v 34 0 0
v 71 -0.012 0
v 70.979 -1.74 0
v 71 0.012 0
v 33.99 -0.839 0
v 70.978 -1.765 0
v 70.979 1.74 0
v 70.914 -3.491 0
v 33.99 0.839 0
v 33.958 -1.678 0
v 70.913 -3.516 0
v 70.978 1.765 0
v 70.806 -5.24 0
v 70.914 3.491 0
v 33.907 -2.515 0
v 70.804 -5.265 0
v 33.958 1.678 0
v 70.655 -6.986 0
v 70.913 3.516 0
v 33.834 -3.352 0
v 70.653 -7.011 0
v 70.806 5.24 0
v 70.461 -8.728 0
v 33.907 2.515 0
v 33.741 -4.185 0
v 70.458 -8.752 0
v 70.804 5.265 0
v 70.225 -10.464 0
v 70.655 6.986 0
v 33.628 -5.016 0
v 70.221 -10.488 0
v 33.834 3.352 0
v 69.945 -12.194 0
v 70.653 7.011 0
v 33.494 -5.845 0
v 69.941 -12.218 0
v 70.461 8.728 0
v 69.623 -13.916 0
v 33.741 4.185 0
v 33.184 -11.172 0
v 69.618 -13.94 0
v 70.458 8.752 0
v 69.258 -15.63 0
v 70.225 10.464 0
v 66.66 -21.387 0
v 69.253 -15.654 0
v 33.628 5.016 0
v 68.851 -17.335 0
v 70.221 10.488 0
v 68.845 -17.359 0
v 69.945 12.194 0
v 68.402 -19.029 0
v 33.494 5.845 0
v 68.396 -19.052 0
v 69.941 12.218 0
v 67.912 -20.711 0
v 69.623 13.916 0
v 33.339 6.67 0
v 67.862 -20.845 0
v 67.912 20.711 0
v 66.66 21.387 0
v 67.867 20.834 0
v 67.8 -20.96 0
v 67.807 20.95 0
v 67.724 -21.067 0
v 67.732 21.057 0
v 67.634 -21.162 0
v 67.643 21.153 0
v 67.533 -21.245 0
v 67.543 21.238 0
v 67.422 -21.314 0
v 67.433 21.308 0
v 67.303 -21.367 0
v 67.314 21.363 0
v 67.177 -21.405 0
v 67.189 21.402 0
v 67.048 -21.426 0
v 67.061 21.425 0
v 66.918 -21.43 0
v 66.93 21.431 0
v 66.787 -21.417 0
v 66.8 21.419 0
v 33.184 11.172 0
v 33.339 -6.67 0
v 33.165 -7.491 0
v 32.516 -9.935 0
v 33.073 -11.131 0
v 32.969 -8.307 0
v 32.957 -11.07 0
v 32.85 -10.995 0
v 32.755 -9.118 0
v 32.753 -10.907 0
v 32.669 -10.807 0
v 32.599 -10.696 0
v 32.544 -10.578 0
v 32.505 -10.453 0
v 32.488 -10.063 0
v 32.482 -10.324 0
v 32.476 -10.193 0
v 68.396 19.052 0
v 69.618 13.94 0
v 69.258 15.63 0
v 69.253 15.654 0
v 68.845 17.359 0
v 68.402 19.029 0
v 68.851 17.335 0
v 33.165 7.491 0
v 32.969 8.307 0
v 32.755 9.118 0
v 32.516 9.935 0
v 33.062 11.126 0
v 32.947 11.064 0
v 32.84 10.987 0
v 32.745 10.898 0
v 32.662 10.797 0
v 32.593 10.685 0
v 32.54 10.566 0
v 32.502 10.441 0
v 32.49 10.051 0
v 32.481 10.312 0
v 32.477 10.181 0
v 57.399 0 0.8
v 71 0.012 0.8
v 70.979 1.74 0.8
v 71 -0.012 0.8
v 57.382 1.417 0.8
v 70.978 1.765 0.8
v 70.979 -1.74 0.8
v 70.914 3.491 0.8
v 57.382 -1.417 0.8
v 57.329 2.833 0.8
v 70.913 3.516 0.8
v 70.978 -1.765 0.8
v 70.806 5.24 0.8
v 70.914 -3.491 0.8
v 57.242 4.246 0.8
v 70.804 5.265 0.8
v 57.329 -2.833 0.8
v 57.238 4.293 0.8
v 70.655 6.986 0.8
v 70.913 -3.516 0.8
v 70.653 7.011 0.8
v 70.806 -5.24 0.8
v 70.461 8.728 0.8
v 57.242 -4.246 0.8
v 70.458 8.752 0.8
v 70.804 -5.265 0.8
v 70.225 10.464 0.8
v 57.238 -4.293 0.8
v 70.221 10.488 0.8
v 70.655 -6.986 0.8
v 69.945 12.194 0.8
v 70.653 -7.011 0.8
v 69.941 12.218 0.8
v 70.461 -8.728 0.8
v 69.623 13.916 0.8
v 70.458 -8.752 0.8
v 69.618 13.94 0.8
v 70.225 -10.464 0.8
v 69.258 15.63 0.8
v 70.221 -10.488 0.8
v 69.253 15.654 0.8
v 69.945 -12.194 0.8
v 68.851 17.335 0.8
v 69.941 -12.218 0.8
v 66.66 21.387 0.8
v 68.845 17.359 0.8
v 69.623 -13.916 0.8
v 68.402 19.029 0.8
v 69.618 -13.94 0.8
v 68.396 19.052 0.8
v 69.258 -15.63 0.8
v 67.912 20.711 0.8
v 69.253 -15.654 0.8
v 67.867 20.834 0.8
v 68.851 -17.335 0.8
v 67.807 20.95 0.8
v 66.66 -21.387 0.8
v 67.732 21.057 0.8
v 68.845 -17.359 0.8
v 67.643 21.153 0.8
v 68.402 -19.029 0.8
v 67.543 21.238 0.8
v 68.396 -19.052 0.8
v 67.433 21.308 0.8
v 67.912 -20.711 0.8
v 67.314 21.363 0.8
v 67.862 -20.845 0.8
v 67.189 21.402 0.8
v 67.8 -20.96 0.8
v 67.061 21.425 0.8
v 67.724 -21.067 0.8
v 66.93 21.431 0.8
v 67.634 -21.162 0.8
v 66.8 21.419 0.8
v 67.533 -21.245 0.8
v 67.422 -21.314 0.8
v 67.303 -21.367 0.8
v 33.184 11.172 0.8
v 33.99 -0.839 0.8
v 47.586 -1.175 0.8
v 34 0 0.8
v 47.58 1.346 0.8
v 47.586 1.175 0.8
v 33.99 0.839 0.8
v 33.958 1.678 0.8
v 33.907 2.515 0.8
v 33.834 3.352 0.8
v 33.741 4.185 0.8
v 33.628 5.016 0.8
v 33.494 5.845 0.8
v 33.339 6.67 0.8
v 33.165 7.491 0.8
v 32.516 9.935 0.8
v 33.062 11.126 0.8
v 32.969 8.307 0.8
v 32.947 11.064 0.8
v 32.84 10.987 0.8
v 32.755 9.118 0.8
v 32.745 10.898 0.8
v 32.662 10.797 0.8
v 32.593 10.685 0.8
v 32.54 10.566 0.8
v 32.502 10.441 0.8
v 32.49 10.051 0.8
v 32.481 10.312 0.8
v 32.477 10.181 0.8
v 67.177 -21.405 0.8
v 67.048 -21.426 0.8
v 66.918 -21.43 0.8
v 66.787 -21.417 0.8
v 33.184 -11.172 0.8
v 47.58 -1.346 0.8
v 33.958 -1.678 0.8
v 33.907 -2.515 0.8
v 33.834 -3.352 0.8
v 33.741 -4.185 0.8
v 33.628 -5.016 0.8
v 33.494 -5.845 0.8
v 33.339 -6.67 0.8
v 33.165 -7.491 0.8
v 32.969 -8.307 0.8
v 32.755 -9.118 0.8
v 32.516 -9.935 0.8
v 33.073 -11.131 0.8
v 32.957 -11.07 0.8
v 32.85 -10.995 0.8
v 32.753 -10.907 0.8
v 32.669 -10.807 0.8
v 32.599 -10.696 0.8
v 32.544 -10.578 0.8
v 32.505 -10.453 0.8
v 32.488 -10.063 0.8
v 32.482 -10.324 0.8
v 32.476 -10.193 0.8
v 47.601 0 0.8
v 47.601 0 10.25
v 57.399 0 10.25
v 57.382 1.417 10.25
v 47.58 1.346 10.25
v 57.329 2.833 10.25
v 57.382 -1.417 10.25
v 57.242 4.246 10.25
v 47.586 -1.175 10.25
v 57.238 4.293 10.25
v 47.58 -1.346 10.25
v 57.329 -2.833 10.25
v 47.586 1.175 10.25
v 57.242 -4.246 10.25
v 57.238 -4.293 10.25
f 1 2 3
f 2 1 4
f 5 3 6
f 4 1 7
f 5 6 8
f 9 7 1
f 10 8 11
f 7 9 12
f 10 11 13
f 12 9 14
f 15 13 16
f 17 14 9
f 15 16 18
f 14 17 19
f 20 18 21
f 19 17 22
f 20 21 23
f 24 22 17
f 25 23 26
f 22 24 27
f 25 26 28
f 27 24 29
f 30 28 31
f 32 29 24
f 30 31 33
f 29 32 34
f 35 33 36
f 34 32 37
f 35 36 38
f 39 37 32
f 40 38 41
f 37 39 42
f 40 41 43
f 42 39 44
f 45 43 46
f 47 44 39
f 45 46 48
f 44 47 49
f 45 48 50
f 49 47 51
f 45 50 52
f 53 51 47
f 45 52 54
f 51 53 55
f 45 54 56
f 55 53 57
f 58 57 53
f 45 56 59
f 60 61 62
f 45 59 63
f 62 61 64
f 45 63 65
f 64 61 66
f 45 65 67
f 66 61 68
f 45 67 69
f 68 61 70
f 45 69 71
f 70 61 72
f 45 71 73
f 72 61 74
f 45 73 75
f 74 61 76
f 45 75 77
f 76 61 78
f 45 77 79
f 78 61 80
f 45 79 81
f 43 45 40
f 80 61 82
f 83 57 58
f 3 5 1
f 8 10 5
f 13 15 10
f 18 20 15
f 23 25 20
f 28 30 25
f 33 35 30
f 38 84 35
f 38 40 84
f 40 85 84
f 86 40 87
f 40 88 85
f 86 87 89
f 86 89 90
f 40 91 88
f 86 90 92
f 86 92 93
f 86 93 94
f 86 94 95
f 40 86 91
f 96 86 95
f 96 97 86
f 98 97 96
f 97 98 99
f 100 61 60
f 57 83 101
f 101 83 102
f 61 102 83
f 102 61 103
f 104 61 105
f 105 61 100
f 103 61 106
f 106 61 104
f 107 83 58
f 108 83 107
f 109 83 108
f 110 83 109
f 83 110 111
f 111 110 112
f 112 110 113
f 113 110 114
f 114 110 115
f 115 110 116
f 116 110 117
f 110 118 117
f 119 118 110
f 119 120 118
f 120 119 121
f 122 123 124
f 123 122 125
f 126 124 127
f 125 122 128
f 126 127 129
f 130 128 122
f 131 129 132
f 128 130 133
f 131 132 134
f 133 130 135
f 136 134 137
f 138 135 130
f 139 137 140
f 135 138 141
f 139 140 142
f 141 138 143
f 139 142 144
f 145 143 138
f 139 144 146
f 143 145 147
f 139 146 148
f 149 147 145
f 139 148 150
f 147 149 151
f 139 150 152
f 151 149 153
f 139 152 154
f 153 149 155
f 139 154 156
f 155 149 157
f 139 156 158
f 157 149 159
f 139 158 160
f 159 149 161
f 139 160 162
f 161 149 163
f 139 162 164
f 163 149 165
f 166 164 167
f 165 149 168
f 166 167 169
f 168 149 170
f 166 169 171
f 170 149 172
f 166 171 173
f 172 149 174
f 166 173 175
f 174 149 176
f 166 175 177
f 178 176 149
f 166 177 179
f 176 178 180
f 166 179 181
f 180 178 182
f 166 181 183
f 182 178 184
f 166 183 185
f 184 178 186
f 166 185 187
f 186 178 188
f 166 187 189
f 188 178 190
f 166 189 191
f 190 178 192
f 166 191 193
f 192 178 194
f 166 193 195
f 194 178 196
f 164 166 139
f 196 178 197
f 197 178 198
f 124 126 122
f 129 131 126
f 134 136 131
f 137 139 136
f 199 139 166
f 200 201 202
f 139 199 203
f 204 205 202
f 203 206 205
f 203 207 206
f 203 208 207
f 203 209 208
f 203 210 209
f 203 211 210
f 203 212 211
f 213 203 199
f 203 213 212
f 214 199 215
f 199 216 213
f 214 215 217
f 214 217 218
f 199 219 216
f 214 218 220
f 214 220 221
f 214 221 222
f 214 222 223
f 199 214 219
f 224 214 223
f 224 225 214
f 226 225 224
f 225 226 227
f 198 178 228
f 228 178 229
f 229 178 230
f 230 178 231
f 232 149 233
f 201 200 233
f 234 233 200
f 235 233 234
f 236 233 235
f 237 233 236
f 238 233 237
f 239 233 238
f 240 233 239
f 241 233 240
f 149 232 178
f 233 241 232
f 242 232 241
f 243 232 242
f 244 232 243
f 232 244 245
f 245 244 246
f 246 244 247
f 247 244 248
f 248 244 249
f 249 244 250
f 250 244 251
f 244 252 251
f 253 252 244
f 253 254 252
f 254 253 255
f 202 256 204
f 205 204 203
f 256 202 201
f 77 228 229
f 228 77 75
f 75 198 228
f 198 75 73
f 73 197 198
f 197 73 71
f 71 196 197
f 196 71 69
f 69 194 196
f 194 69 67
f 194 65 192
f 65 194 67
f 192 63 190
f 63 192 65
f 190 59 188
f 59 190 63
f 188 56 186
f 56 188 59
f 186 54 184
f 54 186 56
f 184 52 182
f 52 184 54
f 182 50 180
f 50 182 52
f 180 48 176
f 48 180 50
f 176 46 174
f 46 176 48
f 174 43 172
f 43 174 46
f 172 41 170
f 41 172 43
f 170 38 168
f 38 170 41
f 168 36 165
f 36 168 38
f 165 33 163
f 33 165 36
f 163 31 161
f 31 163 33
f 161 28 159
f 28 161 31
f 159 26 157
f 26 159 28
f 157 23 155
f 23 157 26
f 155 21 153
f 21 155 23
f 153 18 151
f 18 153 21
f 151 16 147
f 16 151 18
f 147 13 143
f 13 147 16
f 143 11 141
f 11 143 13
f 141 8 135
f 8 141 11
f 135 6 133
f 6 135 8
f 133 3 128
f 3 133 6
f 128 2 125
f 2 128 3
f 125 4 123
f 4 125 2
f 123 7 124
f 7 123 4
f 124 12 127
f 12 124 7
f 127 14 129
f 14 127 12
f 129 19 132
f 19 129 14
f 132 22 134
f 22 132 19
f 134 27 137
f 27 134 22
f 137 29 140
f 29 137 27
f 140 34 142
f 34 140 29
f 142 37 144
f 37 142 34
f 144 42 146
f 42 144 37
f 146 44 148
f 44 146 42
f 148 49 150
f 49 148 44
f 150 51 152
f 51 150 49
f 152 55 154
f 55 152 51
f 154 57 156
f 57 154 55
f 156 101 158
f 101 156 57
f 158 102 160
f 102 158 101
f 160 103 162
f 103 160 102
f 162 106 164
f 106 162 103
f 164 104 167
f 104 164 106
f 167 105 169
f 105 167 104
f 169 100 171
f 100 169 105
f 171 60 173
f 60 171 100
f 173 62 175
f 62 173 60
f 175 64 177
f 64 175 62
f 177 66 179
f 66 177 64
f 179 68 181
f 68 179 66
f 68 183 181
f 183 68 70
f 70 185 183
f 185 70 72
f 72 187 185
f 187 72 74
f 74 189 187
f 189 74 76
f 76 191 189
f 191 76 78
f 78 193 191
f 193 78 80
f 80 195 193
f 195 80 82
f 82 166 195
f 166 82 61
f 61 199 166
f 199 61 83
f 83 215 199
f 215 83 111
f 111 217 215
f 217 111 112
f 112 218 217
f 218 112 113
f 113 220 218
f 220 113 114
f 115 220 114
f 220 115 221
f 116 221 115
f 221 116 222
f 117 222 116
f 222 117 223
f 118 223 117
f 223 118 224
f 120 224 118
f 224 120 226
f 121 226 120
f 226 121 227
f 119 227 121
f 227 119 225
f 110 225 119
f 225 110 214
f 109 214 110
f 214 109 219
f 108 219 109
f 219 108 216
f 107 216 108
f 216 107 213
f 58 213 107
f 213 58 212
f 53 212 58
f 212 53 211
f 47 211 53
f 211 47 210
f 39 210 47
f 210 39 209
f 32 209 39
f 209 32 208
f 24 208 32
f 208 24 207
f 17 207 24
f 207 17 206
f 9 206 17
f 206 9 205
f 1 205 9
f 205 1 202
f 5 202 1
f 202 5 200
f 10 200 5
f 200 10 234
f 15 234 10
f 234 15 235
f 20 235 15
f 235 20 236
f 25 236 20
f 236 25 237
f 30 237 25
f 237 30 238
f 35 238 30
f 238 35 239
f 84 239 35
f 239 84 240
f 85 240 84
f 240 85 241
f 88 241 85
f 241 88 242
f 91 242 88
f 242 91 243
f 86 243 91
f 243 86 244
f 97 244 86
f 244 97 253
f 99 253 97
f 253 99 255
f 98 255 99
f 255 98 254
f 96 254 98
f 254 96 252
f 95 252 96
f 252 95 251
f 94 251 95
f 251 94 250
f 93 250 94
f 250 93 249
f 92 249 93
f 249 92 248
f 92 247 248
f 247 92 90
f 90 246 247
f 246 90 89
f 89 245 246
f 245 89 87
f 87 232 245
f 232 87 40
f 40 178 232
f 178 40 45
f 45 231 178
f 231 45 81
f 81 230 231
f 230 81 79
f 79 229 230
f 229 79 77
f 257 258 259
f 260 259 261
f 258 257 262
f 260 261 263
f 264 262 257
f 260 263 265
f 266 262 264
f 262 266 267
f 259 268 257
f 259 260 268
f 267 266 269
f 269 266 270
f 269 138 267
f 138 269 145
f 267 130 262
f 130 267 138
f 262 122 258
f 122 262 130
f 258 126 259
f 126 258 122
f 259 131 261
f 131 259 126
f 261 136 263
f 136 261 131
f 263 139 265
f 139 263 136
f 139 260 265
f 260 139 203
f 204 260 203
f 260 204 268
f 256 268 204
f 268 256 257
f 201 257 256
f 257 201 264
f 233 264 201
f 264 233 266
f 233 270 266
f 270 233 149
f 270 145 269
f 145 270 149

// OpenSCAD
// file: parameters.scad
// =============================================================================
// Gen-BN — nightly 2026-10-06 (physics_scorer, honest magpylib watts)
// 8-pole / 9-coil (winding factor 0.945, smoother torque and lower cogging than 6-coil) on the Gen-BK R52 rotors/steel, re-wound dense at fill 0.65 with 9.45 mm copper on 35–70 mm bobbins — more turns per metre than Gen-BK at the same ~360 m wire.
// Clocking 0 deg (magnets N facing S) + D-flat keyed bore + index notch + flip-symmetric hole map.
// Windable 2-piece bobbin; turns = physics_scorer turns_fit; copper only between flanges.
// Steel back-iron: 2× Ø138 × 4.76 mm (3/16") mild-steel discs (steel_backiron_disc.dxf); magnets sit ON the steel
// (through-pockets) -> score with --back-iron.
// =============================================================================
topology            = "dual_rotor";

// --- Wire / winding (physics_scorer winding-fit) -------------------------------
wire_awg            = 26;
wire_od             = 0.45;     // insulated OD mm (bare 0.405)
fill_realistic      = 0.65;     // insulated-wire area / window (DENSE layered wind with a jig; scorer cap 0.65)
turns               = 486;       // = physics_scorer turns_fit (do NOT raise)
coil_former_type    = "bobbin";
coil_core_inset     = 12.60;     // radial copper build: hub = copper boundary inset by this
wind_build_axial    = 0.0;      // nothing proud of the flanges
wind_build_radial   = 0.0;

// --- Bobbin (base + lid) ---------------------------------------------------------
coil_id_r           = 35.00;    // copper boundary sector
coil_od_r           = 70.00;
span_deg            = 33.94;    // = pitch - 2*asin((wall+0.85)/coil_id_r) -> >=1.2 mm stator web
former_web          = 9.45;     // copper height between flanges (TALL copper: steel keeps Bz up)
flange_t            = 0.80;     // >= 0.8 mm FDM wall rule (tall winds push on the flanges)
wall                = 1.00;     // flange lip beyond copper
former_bare_h       = former_web + 2 * flange_t;
coil_envelope_h     = former_bare_h + 2 * wind_build_axial;
tab_w               = 7.0;
tab_len             = 7.0;
tab_h               = former_bare_h / 2;
pin_d               = 1.9;      // 1.75 mm filament locating pin
coil_mount_r        = coil_od_r + 0.2 + 4.0;
lead_y              = 1.6;
lead_slot_w         = 0.9;
lead_groove_d       = 0.6;

// --- Gap -------------------------------------------------------------------------
run_clear           = 0.50;     // rotor face -> flange
gap_spacer_h        = run_clear + wind_build_axial;
m2m                 = coil_envelope_h + 2 * run_clear;   // rotor face to rotor face (= gap_sleeve length)

// --- Stator ----------------------------------------------------------------------
coil_stations       = 9;
bay_clear           = 0.25;
stator_thick        = former_bare_h;                        // bobbins flush both faces
stator_od           = 160.0;
shaft_clear_stator  = 14.0;     // stator is static; gap sleeve OD 12 spins inside

// --- Rotor(s) --------------------------------------------------------------------
magnet_Br           = 1.43;     // N52
magnet_d_large      = 20.0;
magnet_h_large      = 5.0;      // one O20x5 per pocket
magnet_h_small      = 5.0;      // one O5x5 per pocket
halbach_magnetisation = "diametric"; // O5x5 assist magnets MUST be DIAMETRICALLY magnetised (tangential)
rotor_b_same_axis   = true;     // same-index magnets share one axis: N faces S across the gap
large_pocket_d      = 20.3;
small_pocket_d      = 5.3;
pocket_h            = 5.10;     // THROUGH the carrier: magnet back face sits on the steel disc
large_n             = 8;
R_large             = 52.0;
R_small_inner       = 41.0;
R_small_mid         = 52.0;
R_small_outer       = 63.0;
small_r_list        = [R_small_inner, R_small_mid, R_small_outer];   // O5 pockets between poles
carrier_od          = 138.0;
carrier_thick       = pocket_h;
hub_h               = 12.0;     // > steel_t + insert: radial set-screw clears the steel
hub_od              = 24.0;     // slim hub so the M4 brace rods fit at R~18 inside the coil ring
hub_insert_d        = 4.0;      // M3 heat-set insert, radial, bears on the D-flat
rotor_b_offset_deg  = 0.0;      // CLOCKING: magnets directly opposite
shaft_key           = "dflat";
dflat_depth         = 0.5;      // 8 mm shaft with 0.5 mm flat (7.5 across flat)
index_notch_d       = 3.0;

// --- Steel back-iron (buyable laser-cut) -------------------------------------------
steel_t             = 4.76;      // mild steel thickness (image method ignores it; sized from steel_flux.py so the return path stays well below saturation)
steel_center_hole   = 26.0;     // slips over the rotor hub (OD 24)
steel_od            = carrier_od;   // steel disc OD = rotor carrier OD

// --- Modular MAX interface ----------------------------------------------------------
shaft_bore          = 8.35;
dflat_x             = 4.0 - dflat_depth + (shaft_bore - 8.0) / 2;
bearing_d           = 21.85;
bearing_h           = 7.2;
m3_clear            = 3.5;
bolt_r_inner        = 30.0;     // M3 steel-disc clamp bolts (inside the magnet ring)
bolt_n_inner        = 4;
bolt_inner_angles   = [0, 90, 180, 270];
bolt_r_outer        = 65.0;     // M3 steel-disc clamp bolts (outside the magnet ring)
bolt_outer_angles   = [45, 135, 225, 315];
flange_bolt_r       = 75.0;     // frame rods: OUTSIDE the rotor OD (rotors spin inside them)
flange_bolt_n       = 9;
flange_bolt_offset  = 20.00;    // between coil stations -> never cuts a lead groove/tab
brace_r             = 18.0;
brace_d             = 4.3;      // temporary M4 jack rods (assembly only)
brace_n             = 4;
brace_angles        = [45, 135, 225, 315];          // flip-symmetric

spacer_pad_od       = 14.0;
spacer_pad_id       = m3_clear;
endbell_od          = 160.0;
endbell_thick       = 8.0;
endbell_shaft_clear = 10.0;
collar_h            = 10.0;
standoff_od         = 9.0;
frame_standoff_h    = run_clear + carrier_thick + hub_h + collar_h + 2.0;
sleeve_od           = 12.0;
plate_max_mm        = 410;

$fn = 64;
// main file
// Gen-BN — bobbin BASE (bottom flange + hub). Print x9, flange down. Wind 26 AWG x 486 t around
// the hub with the LID glued on (coil_lid.stl). Copper lives ONLY between the flanges (no proud winds).
include <parameters.scad>;
$fn = 48;
module sector_2d(r_in, r_out, ang) {
    polygon([
        for (a = [-ang/2 : ang/24 : ang/2]) [r_in*cos(a), r_in*sin(a)],
        for (a = [ang/2 : -ang/24 : -ang/2]) [r_out*cos(a), r_out*sin(a)]
    ]);
}
module footprint_2d() { offset(r=wall) sector_2d(coil_id_r, coil_od_r, span_deg); }
module hub_2d()       { offset(delta=-coil_core_inset) sector_2d(coil_id_r, coil_od_r, span_deg); }

union() {
    linear_extrude(flange_t) footprint_2d();
    translate([0, 0, flange_t - 0.01]) linear_extrude(former_web + 0.01) hub_2d();
}
